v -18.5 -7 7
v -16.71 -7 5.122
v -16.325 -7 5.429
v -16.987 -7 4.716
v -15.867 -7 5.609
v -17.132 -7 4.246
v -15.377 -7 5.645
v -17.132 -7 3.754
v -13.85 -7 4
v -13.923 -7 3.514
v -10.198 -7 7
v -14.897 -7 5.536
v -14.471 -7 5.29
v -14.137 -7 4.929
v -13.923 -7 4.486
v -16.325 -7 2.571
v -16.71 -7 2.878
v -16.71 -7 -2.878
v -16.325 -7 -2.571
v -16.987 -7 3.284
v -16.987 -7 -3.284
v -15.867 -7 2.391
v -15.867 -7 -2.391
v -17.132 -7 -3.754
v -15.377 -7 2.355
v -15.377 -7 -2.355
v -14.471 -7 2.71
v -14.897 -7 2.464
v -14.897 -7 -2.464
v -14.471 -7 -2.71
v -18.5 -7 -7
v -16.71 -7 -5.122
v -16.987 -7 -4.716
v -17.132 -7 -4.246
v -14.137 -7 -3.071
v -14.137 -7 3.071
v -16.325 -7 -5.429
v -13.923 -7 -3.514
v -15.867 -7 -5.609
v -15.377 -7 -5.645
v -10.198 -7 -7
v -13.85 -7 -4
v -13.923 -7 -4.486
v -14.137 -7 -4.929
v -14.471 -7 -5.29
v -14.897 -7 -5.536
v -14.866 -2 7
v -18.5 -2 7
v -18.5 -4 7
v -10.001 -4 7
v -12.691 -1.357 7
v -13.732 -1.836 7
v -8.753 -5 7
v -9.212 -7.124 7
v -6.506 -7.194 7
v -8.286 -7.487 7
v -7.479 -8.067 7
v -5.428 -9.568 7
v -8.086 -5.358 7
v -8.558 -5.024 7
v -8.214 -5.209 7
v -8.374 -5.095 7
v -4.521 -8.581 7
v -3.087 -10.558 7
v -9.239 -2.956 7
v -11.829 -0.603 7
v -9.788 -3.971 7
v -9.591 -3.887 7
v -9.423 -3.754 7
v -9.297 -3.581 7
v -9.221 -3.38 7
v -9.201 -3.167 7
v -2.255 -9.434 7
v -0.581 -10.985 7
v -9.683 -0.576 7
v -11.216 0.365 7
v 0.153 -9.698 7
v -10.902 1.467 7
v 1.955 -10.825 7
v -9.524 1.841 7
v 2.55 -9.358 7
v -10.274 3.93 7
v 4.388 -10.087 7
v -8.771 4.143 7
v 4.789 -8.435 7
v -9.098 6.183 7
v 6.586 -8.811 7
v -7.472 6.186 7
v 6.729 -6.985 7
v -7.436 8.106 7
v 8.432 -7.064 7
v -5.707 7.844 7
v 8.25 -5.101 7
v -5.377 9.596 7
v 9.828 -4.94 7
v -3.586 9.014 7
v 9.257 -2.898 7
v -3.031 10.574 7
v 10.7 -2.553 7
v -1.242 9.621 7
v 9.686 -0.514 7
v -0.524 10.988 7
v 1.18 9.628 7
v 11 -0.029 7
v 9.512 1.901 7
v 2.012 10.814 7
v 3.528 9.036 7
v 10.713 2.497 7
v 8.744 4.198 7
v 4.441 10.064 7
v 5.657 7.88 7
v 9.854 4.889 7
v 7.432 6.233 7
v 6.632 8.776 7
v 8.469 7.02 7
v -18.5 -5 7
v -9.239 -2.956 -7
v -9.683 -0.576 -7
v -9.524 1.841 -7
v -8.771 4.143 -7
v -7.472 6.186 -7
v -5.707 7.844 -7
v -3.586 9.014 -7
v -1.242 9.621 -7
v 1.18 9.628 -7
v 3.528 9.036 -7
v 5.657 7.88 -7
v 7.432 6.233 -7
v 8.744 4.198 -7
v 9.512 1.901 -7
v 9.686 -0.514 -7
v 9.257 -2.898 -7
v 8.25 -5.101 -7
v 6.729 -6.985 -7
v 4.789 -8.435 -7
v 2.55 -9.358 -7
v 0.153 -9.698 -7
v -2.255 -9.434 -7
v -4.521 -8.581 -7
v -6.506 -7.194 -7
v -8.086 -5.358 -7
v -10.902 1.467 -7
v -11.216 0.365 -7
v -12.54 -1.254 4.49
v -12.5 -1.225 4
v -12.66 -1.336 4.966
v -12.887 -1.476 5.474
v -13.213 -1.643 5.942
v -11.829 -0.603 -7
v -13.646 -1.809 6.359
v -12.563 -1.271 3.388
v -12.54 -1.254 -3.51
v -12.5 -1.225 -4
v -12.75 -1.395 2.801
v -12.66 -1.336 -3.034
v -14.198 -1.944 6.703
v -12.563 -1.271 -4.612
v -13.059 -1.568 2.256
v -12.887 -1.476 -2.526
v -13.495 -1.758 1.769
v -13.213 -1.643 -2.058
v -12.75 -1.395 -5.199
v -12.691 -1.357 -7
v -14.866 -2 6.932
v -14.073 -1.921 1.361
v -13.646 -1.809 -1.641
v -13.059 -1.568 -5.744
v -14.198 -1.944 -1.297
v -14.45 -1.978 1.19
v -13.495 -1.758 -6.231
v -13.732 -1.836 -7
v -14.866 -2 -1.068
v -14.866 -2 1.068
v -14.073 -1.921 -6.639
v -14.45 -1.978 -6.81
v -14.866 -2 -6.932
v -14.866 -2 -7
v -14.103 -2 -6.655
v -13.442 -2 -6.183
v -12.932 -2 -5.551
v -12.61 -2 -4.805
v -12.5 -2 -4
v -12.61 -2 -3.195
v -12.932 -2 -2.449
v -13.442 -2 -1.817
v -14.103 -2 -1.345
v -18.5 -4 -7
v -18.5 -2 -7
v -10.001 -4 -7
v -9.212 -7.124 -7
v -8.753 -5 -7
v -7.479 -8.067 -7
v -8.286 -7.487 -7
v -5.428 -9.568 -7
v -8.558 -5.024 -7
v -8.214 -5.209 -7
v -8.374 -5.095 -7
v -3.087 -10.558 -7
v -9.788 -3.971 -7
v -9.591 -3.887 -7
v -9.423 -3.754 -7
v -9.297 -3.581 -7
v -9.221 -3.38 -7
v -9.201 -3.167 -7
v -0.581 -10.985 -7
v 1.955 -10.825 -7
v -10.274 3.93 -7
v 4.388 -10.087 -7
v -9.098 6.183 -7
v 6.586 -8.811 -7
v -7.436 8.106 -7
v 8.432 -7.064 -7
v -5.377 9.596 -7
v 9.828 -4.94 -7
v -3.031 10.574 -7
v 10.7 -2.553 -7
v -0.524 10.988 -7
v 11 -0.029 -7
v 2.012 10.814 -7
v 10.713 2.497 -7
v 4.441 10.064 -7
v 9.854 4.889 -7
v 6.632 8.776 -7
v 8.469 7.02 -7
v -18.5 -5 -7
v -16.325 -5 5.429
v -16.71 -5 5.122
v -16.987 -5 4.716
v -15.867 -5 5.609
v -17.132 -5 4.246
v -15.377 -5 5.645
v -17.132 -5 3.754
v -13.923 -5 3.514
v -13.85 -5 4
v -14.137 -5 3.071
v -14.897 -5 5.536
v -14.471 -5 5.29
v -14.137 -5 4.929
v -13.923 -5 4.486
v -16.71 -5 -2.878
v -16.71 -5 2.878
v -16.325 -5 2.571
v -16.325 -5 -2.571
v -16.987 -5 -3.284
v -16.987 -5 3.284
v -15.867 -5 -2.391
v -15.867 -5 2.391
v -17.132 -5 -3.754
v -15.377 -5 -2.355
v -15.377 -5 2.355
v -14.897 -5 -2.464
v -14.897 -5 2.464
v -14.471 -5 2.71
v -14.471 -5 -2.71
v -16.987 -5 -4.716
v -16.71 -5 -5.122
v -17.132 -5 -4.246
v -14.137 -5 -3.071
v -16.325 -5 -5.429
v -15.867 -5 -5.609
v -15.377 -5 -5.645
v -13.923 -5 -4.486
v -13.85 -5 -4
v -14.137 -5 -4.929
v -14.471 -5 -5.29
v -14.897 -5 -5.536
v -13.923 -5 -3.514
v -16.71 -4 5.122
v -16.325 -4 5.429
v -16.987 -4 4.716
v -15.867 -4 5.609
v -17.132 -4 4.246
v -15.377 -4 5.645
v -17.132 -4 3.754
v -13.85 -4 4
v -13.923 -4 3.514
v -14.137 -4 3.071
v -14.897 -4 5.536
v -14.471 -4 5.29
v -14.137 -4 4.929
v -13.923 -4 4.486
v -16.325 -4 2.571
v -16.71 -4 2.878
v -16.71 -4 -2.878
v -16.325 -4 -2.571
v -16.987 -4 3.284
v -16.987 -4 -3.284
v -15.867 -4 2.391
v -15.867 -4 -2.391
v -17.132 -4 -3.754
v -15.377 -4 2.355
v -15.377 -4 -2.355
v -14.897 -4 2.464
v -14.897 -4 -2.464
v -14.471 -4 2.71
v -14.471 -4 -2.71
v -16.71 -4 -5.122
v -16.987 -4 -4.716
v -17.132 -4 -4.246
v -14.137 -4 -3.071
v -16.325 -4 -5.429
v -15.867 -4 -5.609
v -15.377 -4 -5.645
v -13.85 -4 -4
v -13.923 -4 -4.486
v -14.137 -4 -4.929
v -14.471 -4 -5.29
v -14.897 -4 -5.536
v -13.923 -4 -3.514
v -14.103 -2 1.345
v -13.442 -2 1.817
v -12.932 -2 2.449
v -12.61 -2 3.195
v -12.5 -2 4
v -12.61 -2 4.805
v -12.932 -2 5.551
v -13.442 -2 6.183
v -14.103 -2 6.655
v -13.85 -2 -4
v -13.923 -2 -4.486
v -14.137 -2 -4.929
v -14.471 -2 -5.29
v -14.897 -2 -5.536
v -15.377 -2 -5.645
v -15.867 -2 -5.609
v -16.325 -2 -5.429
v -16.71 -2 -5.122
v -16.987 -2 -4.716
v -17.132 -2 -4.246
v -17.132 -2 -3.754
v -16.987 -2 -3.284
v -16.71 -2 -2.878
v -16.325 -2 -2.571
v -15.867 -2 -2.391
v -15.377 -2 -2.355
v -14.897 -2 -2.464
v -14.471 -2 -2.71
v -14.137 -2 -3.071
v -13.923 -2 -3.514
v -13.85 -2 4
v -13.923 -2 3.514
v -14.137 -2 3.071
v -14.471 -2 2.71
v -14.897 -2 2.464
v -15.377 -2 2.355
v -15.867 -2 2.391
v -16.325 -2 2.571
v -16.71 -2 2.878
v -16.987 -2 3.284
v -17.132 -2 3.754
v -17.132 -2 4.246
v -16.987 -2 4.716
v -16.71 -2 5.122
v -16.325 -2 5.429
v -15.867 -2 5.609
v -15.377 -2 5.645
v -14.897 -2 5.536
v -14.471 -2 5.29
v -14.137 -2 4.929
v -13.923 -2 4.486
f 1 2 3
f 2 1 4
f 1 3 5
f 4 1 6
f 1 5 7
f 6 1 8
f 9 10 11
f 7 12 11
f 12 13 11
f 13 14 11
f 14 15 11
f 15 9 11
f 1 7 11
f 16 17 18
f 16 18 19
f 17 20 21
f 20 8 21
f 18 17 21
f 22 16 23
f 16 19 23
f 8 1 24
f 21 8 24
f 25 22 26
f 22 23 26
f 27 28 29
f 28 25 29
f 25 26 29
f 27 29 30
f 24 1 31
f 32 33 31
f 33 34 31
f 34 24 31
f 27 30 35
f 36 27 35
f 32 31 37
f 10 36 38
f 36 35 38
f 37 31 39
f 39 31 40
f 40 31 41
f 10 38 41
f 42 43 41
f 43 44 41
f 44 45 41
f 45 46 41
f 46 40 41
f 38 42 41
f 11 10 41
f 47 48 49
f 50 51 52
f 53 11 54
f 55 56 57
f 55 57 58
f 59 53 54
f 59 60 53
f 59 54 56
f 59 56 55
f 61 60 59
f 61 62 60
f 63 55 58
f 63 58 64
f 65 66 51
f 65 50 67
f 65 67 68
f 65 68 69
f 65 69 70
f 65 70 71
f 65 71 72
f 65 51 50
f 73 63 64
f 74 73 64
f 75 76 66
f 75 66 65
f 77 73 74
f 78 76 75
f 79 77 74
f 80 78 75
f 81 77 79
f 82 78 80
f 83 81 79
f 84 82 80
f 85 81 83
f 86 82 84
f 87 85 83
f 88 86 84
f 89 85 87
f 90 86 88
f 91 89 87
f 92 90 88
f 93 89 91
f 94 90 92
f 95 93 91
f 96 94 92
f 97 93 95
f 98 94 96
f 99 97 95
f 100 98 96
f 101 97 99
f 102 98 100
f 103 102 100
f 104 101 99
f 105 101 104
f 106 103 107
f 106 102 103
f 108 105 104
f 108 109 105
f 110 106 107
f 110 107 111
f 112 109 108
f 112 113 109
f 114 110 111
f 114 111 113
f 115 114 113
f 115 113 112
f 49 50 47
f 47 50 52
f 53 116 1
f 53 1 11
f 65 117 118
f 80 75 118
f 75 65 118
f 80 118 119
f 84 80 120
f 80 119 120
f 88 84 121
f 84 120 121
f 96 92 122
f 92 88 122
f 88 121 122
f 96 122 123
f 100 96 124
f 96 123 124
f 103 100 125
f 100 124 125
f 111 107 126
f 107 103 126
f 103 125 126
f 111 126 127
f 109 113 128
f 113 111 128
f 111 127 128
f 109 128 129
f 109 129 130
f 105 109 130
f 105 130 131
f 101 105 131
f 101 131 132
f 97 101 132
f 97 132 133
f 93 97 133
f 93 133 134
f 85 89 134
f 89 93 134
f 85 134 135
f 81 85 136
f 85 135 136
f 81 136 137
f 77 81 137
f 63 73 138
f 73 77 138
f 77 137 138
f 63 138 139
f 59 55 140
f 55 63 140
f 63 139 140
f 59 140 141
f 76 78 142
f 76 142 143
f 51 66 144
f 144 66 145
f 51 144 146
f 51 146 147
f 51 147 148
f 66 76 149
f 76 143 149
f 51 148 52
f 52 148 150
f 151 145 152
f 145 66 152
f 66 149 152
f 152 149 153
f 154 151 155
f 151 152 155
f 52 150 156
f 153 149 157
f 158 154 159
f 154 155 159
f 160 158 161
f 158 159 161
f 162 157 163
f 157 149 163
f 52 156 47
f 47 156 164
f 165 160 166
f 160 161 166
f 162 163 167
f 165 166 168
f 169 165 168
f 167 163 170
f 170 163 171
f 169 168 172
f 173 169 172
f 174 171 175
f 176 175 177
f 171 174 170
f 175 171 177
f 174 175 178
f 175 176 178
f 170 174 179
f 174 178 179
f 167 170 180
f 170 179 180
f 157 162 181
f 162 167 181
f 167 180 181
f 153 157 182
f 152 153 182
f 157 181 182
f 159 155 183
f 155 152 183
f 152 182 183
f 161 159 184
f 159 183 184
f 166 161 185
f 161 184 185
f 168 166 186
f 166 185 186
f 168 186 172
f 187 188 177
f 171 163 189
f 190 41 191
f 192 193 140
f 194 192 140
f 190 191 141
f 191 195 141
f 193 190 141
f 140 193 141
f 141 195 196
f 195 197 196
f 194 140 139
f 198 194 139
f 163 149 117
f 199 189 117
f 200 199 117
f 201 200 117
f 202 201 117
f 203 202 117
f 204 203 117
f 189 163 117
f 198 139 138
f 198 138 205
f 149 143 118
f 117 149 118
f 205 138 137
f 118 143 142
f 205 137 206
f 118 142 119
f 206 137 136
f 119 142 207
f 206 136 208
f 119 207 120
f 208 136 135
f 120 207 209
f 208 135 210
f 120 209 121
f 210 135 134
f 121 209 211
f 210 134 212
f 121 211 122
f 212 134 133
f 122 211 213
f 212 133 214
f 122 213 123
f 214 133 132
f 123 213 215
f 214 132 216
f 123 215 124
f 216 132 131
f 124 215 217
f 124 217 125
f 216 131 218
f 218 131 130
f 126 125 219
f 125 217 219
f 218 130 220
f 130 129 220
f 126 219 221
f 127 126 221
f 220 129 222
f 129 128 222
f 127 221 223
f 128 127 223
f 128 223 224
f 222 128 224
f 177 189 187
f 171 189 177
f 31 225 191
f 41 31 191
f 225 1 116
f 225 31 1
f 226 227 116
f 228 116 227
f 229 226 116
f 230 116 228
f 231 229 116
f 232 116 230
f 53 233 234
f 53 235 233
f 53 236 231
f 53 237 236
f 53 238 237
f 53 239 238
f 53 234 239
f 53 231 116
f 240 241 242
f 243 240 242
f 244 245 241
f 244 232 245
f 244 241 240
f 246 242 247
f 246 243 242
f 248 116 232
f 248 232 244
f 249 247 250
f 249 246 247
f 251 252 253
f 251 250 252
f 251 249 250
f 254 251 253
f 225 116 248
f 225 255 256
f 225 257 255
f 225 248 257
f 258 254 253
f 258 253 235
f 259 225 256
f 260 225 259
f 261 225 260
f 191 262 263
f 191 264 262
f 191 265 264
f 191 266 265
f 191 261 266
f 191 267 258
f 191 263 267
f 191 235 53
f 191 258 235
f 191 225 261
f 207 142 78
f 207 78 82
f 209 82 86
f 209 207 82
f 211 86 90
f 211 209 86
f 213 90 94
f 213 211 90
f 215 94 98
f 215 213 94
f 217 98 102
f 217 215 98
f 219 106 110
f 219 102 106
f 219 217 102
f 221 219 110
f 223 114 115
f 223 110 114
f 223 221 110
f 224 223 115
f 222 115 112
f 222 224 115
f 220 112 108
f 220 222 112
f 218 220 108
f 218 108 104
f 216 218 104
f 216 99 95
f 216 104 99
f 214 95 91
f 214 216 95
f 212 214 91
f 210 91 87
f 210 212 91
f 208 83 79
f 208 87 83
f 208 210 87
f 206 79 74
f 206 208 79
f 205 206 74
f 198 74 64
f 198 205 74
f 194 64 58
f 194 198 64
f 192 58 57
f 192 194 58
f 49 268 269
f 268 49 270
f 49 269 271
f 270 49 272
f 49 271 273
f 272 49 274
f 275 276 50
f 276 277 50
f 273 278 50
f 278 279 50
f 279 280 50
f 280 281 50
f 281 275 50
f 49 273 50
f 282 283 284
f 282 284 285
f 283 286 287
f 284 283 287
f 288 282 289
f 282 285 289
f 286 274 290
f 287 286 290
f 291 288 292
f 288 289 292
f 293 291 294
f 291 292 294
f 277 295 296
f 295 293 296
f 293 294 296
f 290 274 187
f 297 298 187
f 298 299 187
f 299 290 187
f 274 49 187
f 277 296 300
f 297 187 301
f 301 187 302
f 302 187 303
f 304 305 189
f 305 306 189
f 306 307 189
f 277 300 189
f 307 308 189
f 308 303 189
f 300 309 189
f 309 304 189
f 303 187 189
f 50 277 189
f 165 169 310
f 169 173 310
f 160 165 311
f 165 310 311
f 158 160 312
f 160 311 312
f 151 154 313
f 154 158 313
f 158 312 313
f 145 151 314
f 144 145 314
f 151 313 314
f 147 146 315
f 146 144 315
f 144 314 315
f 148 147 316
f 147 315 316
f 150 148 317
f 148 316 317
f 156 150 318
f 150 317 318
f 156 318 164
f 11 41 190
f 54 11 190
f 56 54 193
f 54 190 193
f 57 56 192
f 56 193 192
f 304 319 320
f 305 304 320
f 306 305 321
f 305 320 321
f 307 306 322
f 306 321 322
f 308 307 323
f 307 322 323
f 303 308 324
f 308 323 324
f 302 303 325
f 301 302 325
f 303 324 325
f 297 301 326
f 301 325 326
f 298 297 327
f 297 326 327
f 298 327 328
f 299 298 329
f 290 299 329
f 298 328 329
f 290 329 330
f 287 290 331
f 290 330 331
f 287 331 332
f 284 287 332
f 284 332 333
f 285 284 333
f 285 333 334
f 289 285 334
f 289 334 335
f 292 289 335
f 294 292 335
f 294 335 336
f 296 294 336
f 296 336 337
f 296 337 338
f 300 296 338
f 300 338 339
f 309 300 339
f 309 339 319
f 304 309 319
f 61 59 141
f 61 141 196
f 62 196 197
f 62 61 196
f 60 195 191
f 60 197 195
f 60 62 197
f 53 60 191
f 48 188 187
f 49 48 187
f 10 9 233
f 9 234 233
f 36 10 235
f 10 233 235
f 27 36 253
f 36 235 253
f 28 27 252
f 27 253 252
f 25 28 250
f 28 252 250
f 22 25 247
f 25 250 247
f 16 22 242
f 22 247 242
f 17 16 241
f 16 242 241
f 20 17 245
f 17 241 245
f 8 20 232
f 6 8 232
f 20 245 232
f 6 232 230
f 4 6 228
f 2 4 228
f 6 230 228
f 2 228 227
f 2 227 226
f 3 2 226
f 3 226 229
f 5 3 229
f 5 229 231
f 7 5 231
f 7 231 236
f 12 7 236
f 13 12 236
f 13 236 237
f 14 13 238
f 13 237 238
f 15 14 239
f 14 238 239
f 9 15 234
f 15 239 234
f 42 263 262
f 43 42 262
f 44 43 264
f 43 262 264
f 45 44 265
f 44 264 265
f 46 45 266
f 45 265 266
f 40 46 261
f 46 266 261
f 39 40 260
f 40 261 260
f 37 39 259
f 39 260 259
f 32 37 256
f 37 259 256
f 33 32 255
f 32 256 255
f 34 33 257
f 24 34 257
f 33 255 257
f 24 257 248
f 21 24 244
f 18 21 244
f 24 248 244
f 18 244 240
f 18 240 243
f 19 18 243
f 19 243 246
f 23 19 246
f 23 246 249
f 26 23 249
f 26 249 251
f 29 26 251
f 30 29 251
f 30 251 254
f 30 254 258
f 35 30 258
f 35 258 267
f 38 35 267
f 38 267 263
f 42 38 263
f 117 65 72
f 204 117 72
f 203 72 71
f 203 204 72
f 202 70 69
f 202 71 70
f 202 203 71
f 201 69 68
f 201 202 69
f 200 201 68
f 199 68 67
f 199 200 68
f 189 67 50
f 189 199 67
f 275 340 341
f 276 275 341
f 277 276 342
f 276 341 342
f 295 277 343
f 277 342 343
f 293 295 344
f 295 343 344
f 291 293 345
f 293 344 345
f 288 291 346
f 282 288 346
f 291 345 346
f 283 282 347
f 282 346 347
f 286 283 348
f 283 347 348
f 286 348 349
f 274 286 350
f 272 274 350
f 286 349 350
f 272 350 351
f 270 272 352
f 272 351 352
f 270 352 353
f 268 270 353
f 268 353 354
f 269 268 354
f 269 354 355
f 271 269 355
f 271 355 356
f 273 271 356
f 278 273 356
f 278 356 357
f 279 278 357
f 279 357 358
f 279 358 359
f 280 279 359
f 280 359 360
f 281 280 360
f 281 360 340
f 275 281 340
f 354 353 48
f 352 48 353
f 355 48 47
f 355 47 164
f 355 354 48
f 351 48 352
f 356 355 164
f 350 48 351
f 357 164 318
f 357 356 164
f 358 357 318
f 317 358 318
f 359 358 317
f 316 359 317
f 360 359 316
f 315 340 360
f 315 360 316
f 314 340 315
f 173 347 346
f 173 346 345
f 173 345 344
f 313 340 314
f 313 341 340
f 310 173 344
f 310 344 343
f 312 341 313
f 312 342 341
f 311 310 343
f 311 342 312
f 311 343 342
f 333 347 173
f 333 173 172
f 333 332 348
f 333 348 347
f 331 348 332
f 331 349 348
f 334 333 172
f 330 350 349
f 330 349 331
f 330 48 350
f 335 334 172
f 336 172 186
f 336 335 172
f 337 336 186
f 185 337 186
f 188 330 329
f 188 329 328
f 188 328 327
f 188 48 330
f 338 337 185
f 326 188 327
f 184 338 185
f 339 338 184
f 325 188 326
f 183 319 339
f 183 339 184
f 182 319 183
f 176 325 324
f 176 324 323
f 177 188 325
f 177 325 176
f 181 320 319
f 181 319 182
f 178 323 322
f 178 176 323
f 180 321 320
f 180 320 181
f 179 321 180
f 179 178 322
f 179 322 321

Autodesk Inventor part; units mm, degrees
ref_plane "YZ Plane" through (0, 0, 0) normal (1, 0, 0) x (0, 1, 0)
ref_plane "XZ Plane" through (0, 0, 0) normal (0, 1, 0) x (-1, 0, 0)
ref_plane "XY Plane" through (0, 0, 0) normal (0, 0, 1) x (1, 0, 0)
sketch "Skizze1" plane through (0, 0, 0) normal (0, 0, 1) x (1, 0, 0)
  arc A0 (-8.312, -5) -> (-8.8369, -4) centre (0, 0) ccw
  line L0 (-18.5, -7) -> (-8.4853, -7)
  line L1 (-18.5, -7) -> (-18.5, -5)
  line L2 (-18.5, -5) -> (-8.312, -5)
  line L3 (-18.5, -2) -> (-18.5, -4)
  line L4 (-18.5, -4) -> (-8.8369, -4)
  line L5 (-18.5, -2) -> (-14.8661, -2)
  arc A1 (-8.4853, -7) -> (-10.9018, 1.4667) centre (0, 0) ccw
  arc A2 (-14.8661, -2) -> (-10.9018, 1.4667) centre (-14.8661, 2) ccw
  point P0 (-10.8167, -2)
  dimension "d0" = 19.4
  dimension "d2" = 2
  dimension "d4" = 1
  dimension "d5" = 18.5
  dimension "d6" = 4
  dimension "d7" = 1.3
  dimension "d19" = 10.0147
  dimension "d27" = 4
  dimension "d28" = 3.6339
extrude "Extrusion1" add sketch "Skizze1" along normal mid plane 14
sketch "Skizze2" plane through (-18.5, -2, 7) normal (0, 1, 0) x (1, 0, 0)
  circle A0 centre (3, 11) radius 1.65
  line L0 (0, 14) -> (3.6339, 14) projected
  line L1 (0, 14) -> (0, 0) projected
  line L2 (0, 14) -> (0, 0) construction
  line L3 (0, 7) -> (7.2294, 7) construction
  circle A1 centre (3, 3) radius 1.65
  circle A2 centre (3, 11) radius 3
  circle A3 centre (3, 3) radius 3
  point P0 (18.5, 7)
  point P1 (9.7894, 16)
  point P2 (0, 3)
  point P3 (0, 1.3417)
  point P4 (1.1676, 16)
  point P5 (0, 11)
  point P6 (0, 11.3417)
  point P7 (3, 14)
  dimension "d10" = 3
  dimension "d12" = 3.3
  dimension "d20" = 6
  dimension "d29" = 3
extrude "Extrusion2" cut sketch "Skizze2" against normal through all both and the other way through all contours A0 | A1
fillet "Rundung2" radius 4 1 edges at (-8.4853, -7, 0)
fillet "Rundung3" radius 0.8 2 edges at (-8.8369, -4, 0) (-8.312, -5, 0)
extrude "Extrusion4" cut sketch "Skizze2" along normal blind 10 contours A3 | A2
properties part number "Halterung_Pumpe_210403"
